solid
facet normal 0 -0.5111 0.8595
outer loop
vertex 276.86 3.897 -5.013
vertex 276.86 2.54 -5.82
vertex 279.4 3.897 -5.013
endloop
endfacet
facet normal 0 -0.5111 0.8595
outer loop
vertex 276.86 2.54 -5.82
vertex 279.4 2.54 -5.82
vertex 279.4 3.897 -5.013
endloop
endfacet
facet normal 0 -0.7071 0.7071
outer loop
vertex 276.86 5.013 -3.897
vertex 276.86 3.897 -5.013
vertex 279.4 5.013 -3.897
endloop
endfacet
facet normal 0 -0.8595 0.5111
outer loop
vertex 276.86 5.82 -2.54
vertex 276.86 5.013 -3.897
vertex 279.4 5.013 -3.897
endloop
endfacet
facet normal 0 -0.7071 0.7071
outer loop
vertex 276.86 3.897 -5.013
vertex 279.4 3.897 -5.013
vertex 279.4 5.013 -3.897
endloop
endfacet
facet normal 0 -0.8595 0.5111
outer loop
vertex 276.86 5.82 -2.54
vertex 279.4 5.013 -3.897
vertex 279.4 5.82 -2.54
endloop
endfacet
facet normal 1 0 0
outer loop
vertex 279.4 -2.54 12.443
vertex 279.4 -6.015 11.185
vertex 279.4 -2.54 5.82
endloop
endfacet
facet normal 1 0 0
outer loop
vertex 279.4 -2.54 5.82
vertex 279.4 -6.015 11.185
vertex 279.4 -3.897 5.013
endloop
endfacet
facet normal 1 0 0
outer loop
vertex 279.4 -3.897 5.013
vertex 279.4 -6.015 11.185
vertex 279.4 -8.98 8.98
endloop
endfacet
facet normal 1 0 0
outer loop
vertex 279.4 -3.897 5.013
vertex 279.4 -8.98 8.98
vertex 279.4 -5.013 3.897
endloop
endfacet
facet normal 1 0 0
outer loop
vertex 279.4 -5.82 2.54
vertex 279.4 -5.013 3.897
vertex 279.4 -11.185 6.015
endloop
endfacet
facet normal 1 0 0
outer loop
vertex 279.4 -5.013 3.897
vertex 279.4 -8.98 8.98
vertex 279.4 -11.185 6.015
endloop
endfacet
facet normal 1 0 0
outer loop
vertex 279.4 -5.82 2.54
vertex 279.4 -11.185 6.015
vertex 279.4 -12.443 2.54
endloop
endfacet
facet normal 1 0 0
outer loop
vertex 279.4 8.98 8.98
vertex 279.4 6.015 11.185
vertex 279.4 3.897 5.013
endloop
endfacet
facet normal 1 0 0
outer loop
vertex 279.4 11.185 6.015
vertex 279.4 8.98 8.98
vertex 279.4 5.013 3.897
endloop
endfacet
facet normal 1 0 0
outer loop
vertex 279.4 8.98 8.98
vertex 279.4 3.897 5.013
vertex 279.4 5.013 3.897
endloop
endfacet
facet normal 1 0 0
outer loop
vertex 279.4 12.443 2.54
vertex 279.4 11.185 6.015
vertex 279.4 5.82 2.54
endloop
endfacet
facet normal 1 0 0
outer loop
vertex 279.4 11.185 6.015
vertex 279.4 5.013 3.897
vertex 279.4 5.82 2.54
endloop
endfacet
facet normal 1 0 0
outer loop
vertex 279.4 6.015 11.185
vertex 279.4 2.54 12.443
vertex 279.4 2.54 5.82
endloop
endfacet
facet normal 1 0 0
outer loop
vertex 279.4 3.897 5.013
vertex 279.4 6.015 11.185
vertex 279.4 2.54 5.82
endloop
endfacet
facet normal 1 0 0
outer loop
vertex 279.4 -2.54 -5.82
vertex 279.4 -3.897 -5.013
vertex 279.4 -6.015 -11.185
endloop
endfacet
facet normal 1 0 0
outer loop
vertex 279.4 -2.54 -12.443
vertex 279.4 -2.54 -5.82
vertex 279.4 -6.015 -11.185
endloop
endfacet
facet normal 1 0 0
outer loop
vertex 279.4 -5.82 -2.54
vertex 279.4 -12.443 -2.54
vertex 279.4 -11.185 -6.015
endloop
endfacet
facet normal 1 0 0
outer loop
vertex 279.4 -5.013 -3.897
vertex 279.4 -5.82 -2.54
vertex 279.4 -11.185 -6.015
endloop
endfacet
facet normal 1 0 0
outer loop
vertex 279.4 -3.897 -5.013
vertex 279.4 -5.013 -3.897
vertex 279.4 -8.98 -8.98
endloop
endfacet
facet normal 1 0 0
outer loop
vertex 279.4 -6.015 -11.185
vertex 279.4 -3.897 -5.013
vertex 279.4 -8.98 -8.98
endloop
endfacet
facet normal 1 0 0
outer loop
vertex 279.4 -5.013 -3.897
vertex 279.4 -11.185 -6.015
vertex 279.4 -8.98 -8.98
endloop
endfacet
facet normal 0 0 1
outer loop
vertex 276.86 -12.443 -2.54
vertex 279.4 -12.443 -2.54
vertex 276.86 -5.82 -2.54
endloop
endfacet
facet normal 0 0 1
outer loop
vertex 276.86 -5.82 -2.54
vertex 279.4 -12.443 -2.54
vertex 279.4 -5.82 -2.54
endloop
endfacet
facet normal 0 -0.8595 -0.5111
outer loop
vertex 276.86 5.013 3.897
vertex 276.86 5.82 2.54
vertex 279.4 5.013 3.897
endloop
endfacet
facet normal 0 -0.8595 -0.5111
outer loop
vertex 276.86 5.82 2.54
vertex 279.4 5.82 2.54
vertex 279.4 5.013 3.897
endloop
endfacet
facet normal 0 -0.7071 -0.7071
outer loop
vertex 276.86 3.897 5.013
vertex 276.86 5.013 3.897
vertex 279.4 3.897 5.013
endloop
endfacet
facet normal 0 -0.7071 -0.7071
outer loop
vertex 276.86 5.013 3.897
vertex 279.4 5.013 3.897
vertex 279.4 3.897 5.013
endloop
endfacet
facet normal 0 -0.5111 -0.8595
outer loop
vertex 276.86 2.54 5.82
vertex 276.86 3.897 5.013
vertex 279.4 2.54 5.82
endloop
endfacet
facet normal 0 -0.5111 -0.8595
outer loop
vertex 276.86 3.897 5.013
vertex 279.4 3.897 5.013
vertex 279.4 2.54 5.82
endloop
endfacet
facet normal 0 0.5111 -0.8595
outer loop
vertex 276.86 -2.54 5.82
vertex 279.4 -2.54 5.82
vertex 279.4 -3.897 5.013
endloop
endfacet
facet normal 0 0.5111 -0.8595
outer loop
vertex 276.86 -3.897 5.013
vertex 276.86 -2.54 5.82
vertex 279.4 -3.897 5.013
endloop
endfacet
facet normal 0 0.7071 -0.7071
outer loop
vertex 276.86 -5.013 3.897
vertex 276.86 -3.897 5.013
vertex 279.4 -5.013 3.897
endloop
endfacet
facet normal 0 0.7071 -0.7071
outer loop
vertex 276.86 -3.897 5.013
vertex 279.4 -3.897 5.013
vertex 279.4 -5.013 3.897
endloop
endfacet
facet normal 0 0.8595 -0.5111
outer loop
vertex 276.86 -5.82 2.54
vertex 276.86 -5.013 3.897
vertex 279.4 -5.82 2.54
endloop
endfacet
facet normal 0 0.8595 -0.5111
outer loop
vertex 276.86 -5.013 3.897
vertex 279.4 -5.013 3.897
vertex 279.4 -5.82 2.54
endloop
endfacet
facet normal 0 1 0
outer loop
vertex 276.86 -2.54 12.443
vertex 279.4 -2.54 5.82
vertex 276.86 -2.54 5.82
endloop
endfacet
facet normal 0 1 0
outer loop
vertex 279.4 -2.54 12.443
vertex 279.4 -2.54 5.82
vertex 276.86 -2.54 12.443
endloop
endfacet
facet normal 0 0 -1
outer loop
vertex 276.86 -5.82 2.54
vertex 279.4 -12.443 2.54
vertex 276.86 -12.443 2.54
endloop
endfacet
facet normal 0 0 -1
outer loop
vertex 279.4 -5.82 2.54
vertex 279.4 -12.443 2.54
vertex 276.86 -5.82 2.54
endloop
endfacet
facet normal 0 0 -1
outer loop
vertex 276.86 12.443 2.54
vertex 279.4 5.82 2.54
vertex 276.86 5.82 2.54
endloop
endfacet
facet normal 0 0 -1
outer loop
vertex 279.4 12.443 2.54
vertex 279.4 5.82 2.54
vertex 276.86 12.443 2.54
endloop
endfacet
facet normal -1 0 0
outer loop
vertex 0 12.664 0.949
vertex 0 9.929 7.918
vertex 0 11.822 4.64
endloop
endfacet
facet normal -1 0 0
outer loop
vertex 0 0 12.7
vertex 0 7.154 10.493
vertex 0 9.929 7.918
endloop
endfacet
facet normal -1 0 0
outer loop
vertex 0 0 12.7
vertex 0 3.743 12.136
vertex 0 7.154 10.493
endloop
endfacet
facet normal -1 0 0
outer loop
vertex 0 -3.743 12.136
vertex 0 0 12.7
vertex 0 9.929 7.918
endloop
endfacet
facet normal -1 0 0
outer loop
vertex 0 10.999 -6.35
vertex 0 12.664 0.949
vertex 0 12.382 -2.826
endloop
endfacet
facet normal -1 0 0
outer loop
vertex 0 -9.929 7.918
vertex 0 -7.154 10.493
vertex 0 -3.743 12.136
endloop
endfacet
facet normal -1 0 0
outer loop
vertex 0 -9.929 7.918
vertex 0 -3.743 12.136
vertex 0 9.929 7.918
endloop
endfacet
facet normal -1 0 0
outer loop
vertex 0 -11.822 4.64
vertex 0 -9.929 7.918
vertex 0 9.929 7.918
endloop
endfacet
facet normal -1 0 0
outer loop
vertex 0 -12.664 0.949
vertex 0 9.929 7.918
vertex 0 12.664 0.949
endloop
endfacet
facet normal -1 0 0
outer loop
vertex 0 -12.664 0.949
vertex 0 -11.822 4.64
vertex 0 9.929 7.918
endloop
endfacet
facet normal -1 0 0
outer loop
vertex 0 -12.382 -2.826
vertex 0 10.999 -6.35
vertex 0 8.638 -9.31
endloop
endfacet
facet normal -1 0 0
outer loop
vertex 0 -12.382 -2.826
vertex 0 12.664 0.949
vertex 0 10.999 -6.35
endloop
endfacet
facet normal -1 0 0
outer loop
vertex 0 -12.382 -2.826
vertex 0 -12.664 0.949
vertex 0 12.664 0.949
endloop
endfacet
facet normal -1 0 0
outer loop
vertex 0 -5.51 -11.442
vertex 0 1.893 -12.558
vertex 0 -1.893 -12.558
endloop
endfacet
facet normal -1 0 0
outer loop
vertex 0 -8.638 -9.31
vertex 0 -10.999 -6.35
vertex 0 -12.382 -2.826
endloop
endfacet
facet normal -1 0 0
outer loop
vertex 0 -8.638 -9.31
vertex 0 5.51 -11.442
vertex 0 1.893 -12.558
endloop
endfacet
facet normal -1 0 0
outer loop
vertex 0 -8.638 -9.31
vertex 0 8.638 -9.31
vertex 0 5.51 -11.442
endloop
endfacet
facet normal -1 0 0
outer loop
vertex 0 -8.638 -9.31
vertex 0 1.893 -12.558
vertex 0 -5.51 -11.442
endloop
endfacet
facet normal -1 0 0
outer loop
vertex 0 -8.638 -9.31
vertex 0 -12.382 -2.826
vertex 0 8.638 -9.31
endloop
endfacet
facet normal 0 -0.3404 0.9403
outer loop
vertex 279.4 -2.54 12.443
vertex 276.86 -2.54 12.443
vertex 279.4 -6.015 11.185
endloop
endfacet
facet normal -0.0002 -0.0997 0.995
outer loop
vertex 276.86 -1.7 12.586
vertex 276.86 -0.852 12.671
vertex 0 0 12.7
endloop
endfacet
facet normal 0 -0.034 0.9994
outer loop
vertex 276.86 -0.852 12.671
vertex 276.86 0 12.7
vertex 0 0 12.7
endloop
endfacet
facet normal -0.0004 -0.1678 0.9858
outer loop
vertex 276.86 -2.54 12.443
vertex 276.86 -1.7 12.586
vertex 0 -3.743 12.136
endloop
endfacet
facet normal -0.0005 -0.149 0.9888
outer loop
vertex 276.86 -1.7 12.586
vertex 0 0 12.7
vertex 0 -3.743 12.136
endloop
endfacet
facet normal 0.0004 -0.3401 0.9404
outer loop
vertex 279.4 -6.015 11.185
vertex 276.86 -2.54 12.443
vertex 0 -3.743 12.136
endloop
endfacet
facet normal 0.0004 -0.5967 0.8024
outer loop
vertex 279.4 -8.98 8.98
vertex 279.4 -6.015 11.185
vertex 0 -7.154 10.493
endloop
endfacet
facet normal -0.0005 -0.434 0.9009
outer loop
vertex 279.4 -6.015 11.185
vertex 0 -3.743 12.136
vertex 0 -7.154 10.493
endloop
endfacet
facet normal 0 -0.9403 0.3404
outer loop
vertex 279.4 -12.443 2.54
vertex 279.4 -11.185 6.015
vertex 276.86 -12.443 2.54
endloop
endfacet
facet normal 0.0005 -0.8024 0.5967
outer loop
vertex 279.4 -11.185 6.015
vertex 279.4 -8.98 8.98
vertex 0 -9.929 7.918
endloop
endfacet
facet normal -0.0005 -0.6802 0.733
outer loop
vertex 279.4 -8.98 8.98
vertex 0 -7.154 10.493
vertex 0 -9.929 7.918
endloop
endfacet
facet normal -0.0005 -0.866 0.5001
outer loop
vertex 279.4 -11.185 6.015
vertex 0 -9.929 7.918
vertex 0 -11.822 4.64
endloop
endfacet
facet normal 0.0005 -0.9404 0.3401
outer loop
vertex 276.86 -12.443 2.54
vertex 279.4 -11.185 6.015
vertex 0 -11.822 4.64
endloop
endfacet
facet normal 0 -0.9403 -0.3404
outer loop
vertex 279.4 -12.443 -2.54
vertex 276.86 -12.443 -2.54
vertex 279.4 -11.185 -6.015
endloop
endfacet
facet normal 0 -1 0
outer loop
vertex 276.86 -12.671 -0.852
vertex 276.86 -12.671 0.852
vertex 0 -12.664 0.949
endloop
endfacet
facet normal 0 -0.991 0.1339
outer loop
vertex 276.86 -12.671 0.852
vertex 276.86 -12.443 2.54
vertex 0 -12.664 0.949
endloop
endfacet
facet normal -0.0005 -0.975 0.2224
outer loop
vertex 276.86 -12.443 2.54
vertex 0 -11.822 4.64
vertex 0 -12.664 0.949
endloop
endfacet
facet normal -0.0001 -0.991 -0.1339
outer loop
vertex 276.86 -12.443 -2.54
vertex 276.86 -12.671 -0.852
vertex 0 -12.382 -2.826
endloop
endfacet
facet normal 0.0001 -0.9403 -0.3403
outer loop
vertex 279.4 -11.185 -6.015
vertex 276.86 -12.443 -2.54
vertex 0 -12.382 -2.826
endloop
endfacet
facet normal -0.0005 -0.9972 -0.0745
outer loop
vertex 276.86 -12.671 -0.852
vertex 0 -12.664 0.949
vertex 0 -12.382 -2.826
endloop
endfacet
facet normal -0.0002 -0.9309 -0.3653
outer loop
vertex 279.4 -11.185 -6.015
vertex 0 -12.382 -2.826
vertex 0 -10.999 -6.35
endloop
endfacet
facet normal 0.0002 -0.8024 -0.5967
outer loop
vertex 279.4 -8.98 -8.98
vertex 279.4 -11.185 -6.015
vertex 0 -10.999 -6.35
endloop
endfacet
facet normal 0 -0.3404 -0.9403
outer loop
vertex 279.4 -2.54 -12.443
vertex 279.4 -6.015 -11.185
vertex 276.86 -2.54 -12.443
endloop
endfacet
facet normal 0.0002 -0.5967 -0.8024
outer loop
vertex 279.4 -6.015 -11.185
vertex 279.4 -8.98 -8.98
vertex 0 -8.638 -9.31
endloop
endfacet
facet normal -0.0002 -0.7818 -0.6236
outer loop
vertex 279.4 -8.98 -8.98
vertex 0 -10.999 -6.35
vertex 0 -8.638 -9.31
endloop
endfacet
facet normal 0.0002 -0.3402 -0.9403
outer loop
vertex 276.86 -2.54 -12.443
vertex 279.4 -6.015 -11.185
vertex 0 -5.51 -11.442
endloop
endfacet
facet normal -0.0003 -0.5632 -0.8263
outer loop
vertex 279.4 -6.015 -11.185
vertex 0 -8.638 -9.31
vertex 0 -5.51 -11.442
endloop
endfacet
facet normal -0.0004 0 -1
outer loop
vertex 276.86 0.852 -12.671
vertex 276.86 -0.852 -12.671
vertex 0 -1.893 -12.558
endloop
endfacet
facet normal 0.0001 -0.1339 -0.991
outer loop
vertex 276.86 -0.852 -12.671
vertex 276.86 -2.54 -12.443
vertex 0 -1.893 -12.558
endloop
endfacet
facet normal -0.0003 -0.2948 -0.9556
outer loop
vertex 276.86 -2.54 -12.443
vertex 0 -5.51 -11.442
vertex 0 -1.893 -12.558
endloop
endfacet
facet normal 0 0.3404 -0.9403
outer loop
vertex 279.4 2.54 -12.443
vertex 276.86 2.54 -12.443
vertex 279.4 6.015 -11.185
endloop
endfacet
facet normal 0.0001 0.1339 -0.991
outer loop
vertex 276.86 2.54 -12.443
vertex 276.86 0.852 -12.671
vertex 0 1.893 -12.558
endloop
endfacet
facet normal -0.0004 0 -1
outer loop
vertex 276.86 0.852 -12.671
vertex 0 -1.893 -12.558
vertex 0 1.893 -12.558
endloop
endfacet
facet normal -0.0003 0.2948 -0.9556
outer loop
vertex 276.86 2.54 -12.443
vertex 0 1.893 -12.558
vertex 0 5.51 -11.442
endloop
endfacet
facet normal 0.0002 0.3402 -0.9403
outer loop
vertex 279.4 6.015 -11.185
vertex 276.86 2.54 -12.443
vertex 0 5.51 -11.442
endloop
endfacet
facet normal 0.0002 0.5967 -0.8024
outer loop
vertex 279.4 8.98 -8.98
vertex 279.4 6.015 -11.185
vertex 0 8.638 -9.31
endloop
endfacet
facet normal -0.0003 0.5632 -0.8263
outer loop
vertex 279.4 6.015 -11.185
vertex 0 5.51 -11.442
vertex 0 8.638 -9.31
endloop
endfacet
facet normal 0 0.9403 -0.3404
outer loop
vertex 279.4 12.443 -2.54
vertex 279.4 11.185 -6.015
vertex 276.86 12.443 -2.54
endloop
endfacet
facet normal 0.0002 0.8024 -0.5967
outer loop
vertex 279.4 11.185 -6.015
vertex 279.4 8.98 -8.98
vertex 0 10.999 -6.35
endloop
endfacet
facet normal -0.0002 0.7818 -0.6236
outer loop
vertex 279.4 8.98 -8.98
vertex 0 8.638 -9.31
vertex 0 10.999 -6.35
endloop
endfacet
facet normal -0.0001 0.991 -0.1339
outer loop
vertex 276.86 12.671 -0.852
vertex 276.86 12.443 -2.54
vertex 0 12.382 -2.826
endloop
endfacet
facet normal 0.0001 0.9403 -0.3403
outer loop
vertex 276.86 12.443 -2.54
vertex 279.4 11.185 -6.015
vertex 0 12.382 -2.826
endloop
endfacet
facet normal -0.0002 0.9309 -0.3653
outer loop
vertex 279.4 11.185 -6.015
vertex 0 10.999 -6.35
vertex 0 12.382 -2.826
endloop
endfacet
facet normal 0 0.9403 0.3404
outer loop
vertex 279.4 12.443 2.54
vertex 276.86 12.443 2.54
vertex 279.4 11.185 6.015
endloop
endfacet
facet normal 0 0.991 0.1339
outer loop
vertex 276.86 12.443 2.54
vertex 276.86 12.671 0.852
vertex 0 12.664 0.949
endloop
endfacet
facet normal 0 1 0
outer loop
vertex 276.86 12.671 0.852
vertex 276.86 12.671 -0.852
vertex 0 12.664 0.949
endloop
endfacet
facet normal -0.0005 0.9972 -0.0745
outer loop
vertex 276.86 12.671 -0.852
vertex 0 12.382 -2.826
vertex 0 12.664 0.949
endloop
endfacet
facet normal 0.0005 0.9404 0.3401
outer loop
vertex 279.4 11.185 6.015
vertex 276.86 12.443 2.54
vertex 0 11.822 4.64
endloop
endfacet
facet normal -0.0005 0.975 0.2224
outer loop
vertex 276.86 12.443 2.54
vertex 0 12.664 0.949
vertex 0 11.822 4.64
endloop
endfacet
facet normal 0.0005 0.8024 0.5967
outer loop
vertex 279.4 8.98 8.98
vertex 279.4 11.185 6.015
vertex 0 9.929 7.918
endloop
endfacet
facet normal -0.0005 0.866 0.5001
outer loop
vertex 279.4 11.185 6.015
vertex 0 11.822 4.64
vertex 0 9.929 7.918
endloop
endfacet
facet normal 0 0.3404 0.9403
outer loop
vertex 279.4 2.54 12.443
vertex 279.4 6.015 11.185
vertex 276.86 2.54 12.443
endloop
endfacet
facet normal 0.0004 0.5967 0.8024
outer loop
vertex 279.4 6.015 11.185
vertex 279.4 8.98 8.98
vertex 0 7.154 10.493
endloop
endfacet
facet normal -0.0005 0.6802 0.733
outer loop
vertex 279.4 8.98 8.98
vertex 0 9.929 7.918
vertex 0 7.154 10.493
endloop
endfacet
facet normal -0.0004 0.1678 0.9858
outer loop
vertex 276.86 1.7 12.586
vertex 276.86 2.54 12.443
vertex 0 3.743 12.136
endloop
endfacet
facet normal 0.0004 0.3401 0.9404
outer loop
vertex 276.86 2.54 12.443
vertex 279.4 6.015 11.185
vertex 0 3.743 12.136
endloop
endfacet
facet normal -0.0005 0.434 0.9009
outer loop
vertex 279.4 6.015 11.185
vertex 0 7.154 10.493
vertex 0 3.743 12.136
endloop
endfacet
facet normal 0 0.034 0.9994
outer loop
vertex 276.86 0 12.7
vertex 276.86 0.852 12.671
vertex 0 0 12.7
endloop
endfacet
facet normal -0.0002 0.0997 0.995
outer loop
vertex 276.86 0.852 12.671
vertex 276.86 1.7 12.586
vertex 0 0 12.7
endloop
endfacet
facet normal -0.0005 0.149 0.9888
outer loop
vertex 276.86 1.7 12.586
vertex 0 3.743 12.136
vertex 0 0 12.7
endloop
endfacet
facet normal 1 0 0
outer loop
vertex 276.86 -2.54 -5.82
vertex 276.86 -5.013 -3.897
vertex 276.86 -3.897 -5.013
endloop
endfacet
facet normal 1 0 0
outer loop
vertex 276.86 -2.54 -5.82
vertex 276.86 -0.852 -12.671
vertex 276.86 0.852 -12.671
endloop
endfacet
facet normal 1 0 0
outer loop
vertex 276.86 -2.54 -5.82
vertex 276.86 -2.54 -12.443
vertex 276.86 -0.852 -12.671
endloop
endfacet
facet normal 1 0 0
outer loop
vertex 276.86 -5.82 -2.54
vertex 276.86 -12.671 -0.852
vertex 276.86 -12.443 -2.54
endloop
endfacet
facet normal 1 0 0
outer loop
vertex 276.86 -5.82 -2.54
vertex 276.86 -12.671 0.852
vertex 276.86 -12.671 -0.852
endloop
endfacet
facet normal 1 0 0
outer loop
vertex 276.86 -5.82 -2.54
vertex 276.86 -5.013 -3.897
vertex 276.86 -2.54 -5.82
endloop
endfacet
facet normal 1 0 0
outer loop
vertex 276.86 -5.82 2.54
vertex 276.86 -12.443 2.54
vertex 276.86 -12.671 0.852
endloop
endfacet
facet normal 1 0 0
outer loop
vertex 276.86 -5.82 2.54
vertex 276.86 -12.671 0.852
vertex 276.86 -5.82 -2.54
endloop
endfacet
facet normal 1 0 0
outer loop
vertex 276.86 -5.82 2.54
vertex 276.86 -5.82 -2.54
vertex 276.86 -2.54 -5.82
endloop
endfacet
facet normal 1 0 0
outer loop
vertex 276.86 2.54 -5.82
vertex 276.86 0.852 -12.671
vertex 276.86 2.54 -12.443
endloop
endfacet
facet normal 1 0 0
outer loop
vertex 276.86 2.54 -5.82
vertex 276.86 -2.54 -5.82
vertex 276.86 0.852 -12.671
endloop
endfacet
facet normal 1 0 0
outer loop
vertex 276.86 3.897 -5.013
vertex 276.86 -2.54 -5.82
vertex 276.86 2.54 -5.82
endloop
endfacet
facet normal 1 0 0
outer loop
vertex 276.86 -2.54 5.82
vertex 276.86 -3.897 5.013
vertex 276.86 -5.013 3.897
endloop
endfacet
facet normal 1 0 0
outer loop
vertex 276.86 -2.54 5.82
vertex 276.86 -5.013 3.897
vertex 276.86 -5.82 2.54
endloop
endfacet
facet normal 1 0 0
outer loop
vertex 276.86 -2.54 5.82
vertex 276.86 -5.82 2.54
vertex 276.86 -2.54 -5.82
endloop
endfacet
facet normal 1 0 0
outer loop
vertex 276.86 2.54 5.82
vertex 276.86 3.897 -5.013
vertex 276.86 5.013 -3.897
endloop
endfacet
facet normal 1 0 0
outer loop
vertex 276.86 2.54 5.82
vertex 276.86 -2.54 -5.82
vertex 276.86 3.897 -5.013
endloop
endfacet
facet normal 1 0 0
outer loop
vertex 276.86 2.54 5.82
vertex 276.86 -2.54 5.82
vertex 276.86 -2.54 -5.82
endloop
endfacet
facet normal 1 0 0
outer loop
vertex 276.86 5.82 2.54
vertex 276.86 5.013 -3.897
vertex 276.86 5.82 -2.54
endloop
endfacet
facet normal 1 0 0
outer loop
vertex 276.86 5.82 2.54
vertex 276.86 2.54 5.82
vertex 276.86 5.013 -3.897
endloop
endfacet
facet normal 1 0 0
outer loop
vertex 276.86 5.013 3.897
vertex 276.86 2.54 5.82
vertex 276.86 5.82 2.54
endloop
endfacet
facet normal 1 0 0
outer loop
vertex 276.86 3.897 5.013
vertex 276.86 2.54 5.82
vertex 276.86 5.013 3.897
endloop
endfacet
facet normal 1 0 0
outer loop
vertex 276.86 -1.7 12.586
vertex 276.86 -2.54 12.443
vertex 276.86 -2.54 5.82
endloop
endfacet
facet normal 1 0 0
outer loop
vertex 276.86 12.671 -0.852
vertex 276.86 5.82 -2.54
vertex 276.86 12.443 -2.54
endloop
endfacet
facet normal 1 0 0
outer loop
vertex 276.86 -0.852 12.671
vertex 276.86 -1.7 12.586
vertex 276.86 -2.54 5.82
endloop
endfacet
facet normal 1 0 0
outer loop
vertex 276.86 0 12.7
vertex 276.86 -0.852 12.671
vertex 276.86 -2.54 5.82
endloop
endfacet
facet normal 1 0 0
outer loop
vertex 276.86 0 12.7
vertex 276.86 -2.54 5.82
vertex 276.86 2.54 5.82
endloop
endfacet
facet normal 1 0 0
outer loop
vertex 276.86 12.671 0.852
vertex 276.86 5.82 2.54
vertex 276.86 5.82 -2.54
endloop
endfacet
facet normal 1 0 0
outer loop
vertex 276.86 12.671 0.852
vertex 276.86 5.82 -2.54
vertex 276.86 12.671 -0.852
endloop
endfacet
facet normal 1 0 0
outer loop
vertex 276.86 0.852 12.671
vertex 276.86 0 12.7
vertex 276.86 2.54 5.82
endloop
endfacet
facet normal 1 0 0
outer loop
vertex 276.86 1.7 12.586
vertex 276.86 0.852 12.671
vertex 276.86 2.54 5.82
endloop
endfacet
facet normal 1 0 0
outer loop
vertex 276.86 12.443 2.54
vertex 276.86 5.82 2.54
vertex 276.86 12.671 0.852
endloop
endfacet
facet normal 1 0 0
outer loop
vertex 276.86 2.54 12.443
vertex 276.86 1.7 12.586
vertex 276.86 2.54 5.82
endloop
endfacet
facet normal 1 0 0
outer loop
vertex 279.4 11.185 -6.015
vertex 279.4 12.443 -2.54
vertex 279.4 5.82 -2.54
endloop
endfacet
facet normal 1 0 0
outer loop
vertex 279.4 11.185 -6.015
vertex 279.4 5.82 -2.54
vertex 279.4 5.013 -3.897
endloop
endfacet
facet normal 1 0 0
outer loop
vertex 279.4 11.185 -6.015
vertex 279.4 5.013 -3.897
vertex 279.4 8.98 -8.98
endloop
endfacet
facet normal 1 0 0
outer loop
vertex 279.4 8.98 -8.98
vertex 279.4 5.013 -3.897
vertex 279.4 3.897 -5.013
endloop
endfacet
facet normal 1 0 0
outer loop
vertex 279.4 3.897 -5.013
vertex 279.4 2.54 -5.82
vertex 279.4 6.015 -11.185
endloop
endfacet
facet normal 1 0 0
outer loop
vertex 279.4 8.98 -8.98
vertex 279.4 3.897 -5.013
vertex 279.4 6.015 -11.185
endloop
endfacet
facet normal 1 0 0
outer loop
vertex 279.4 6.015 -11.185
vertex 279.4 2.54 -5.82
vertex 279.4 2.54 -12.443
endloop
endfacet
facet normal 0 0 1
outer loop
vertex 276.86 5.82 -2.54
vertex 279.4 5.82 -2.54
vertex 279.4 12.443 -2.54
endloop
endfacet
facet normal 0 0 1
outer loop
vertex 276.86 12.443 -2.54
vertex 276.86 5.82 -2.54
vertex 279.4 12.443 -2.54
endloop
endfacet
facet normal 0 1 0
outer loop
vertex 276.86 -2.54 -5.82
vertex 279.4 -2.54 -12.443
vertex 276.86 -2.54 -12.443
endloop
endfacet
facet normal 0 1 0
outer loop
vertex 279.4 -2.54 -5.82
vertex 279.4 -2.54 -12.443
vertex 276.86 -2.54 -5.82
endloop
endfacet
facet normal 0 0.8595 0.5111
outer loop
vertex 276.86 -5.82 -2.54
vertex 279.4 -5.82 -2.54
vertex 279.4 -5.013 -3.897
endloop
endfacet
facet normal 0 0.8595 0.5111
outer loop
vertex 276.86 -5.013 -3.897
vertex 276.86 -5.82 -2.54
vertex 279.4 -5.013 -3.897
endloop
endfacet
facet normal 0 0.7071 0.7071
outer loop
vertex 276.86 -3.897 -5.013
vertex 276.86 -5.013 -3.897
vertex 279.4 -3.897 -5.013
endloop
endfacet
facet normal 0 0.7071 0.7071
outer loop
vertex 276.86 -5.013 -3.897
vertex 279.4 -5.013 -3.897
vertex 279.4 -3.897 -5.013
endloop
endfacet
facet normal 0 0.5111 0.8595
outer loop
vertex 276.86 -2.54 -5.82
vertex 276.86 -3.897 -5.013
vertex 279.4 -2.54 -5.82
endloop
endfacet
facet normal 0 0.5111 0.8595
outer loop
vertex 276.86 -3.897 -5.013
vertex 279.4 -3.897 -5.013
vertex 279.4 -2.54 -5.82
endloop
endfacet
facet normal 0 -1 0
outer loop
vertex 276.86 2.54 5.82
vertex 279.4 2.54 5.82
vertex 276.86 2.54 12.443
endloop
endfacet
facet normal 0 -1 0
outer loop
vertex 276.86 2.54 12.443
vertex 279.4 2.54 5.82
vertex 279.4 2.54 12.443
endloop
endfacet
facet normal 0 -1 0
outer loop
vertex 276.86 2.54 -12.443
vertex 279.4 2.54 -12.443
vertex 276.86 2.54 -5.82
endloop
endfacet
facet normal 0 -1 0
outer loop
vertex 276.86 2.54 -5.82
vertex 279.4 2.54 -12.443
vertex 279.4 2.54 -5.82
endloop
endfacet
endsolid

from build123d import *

# Parameters (mm, degrees)
F0_W     = 39.190798
F0_H     = 12.7
F0_W_2   = 212.120296
F3_W     = 5.08
F3_H     = 13.252163
F3_W_2   = 19.028907
F3_H_2   = 5.08
F4_DEPTH = 2.54
F5_DEPTH = 2.54


with BuildPart() as f1:
    # F0 (on Front) → F1 (revolve)
    with BuildSketch(Plane.XZ):
        with Locations((19.595399, 6.35)):
            Rectangle(F0_W, F0_H)
        with Locations((145.250946, 6.35)):
            Rectangle(F0_W_2, F0_H)
        Polygon((279.4, 12.7), (251.311094, 12.7), (251.311094, 0), (276.86, 0), (276.86, 6.35), (279.4, 6.35), align=None)
    revolve(axis=Axis((146.856308, 0, 0), (1, 0, 0)))

    # F3 (on face) → F4 (cut)
    with BuildSketch(Plane.YZ.offset(279.4)):
        with Locations((0, -9.166081)):
            Rectangle(F3_W, F3_H)
        with Locations((12.054453, 0)):
            Rectangle(F3_W_2, F3_H_2)
        with Locations((-12.054453, 0)):
            Rectangle(F3_W_2, F3_H_2)
        with Locations((0, 9.166081)):
            Rectangle(F3_W, F3_H)
    extrude(amount=-F4_DEPTH, mode=Mode.SUBTRACT)

    # F3 (on face) → F5 (cut)
    with BuildSketch(Plane.YZ.offset(279.4)):
        with Locations((0, -9.166081)):
            Rectangle(F3_W, F3_H)
        with Locations((12.054453, 0)):
            Rectangle(F3_W_2, F3_H_2)
        with Locations((-12.054453, 0)):
            Rectangle(F3_W_2, F3_H_2)
        with Locations((0, 9.166081)):
            Rectangle(F3_W, F3_H)
    extrude(amount=-F5_DEPTH, mode=Mode.SUBTRACT)


solid = f1.part
